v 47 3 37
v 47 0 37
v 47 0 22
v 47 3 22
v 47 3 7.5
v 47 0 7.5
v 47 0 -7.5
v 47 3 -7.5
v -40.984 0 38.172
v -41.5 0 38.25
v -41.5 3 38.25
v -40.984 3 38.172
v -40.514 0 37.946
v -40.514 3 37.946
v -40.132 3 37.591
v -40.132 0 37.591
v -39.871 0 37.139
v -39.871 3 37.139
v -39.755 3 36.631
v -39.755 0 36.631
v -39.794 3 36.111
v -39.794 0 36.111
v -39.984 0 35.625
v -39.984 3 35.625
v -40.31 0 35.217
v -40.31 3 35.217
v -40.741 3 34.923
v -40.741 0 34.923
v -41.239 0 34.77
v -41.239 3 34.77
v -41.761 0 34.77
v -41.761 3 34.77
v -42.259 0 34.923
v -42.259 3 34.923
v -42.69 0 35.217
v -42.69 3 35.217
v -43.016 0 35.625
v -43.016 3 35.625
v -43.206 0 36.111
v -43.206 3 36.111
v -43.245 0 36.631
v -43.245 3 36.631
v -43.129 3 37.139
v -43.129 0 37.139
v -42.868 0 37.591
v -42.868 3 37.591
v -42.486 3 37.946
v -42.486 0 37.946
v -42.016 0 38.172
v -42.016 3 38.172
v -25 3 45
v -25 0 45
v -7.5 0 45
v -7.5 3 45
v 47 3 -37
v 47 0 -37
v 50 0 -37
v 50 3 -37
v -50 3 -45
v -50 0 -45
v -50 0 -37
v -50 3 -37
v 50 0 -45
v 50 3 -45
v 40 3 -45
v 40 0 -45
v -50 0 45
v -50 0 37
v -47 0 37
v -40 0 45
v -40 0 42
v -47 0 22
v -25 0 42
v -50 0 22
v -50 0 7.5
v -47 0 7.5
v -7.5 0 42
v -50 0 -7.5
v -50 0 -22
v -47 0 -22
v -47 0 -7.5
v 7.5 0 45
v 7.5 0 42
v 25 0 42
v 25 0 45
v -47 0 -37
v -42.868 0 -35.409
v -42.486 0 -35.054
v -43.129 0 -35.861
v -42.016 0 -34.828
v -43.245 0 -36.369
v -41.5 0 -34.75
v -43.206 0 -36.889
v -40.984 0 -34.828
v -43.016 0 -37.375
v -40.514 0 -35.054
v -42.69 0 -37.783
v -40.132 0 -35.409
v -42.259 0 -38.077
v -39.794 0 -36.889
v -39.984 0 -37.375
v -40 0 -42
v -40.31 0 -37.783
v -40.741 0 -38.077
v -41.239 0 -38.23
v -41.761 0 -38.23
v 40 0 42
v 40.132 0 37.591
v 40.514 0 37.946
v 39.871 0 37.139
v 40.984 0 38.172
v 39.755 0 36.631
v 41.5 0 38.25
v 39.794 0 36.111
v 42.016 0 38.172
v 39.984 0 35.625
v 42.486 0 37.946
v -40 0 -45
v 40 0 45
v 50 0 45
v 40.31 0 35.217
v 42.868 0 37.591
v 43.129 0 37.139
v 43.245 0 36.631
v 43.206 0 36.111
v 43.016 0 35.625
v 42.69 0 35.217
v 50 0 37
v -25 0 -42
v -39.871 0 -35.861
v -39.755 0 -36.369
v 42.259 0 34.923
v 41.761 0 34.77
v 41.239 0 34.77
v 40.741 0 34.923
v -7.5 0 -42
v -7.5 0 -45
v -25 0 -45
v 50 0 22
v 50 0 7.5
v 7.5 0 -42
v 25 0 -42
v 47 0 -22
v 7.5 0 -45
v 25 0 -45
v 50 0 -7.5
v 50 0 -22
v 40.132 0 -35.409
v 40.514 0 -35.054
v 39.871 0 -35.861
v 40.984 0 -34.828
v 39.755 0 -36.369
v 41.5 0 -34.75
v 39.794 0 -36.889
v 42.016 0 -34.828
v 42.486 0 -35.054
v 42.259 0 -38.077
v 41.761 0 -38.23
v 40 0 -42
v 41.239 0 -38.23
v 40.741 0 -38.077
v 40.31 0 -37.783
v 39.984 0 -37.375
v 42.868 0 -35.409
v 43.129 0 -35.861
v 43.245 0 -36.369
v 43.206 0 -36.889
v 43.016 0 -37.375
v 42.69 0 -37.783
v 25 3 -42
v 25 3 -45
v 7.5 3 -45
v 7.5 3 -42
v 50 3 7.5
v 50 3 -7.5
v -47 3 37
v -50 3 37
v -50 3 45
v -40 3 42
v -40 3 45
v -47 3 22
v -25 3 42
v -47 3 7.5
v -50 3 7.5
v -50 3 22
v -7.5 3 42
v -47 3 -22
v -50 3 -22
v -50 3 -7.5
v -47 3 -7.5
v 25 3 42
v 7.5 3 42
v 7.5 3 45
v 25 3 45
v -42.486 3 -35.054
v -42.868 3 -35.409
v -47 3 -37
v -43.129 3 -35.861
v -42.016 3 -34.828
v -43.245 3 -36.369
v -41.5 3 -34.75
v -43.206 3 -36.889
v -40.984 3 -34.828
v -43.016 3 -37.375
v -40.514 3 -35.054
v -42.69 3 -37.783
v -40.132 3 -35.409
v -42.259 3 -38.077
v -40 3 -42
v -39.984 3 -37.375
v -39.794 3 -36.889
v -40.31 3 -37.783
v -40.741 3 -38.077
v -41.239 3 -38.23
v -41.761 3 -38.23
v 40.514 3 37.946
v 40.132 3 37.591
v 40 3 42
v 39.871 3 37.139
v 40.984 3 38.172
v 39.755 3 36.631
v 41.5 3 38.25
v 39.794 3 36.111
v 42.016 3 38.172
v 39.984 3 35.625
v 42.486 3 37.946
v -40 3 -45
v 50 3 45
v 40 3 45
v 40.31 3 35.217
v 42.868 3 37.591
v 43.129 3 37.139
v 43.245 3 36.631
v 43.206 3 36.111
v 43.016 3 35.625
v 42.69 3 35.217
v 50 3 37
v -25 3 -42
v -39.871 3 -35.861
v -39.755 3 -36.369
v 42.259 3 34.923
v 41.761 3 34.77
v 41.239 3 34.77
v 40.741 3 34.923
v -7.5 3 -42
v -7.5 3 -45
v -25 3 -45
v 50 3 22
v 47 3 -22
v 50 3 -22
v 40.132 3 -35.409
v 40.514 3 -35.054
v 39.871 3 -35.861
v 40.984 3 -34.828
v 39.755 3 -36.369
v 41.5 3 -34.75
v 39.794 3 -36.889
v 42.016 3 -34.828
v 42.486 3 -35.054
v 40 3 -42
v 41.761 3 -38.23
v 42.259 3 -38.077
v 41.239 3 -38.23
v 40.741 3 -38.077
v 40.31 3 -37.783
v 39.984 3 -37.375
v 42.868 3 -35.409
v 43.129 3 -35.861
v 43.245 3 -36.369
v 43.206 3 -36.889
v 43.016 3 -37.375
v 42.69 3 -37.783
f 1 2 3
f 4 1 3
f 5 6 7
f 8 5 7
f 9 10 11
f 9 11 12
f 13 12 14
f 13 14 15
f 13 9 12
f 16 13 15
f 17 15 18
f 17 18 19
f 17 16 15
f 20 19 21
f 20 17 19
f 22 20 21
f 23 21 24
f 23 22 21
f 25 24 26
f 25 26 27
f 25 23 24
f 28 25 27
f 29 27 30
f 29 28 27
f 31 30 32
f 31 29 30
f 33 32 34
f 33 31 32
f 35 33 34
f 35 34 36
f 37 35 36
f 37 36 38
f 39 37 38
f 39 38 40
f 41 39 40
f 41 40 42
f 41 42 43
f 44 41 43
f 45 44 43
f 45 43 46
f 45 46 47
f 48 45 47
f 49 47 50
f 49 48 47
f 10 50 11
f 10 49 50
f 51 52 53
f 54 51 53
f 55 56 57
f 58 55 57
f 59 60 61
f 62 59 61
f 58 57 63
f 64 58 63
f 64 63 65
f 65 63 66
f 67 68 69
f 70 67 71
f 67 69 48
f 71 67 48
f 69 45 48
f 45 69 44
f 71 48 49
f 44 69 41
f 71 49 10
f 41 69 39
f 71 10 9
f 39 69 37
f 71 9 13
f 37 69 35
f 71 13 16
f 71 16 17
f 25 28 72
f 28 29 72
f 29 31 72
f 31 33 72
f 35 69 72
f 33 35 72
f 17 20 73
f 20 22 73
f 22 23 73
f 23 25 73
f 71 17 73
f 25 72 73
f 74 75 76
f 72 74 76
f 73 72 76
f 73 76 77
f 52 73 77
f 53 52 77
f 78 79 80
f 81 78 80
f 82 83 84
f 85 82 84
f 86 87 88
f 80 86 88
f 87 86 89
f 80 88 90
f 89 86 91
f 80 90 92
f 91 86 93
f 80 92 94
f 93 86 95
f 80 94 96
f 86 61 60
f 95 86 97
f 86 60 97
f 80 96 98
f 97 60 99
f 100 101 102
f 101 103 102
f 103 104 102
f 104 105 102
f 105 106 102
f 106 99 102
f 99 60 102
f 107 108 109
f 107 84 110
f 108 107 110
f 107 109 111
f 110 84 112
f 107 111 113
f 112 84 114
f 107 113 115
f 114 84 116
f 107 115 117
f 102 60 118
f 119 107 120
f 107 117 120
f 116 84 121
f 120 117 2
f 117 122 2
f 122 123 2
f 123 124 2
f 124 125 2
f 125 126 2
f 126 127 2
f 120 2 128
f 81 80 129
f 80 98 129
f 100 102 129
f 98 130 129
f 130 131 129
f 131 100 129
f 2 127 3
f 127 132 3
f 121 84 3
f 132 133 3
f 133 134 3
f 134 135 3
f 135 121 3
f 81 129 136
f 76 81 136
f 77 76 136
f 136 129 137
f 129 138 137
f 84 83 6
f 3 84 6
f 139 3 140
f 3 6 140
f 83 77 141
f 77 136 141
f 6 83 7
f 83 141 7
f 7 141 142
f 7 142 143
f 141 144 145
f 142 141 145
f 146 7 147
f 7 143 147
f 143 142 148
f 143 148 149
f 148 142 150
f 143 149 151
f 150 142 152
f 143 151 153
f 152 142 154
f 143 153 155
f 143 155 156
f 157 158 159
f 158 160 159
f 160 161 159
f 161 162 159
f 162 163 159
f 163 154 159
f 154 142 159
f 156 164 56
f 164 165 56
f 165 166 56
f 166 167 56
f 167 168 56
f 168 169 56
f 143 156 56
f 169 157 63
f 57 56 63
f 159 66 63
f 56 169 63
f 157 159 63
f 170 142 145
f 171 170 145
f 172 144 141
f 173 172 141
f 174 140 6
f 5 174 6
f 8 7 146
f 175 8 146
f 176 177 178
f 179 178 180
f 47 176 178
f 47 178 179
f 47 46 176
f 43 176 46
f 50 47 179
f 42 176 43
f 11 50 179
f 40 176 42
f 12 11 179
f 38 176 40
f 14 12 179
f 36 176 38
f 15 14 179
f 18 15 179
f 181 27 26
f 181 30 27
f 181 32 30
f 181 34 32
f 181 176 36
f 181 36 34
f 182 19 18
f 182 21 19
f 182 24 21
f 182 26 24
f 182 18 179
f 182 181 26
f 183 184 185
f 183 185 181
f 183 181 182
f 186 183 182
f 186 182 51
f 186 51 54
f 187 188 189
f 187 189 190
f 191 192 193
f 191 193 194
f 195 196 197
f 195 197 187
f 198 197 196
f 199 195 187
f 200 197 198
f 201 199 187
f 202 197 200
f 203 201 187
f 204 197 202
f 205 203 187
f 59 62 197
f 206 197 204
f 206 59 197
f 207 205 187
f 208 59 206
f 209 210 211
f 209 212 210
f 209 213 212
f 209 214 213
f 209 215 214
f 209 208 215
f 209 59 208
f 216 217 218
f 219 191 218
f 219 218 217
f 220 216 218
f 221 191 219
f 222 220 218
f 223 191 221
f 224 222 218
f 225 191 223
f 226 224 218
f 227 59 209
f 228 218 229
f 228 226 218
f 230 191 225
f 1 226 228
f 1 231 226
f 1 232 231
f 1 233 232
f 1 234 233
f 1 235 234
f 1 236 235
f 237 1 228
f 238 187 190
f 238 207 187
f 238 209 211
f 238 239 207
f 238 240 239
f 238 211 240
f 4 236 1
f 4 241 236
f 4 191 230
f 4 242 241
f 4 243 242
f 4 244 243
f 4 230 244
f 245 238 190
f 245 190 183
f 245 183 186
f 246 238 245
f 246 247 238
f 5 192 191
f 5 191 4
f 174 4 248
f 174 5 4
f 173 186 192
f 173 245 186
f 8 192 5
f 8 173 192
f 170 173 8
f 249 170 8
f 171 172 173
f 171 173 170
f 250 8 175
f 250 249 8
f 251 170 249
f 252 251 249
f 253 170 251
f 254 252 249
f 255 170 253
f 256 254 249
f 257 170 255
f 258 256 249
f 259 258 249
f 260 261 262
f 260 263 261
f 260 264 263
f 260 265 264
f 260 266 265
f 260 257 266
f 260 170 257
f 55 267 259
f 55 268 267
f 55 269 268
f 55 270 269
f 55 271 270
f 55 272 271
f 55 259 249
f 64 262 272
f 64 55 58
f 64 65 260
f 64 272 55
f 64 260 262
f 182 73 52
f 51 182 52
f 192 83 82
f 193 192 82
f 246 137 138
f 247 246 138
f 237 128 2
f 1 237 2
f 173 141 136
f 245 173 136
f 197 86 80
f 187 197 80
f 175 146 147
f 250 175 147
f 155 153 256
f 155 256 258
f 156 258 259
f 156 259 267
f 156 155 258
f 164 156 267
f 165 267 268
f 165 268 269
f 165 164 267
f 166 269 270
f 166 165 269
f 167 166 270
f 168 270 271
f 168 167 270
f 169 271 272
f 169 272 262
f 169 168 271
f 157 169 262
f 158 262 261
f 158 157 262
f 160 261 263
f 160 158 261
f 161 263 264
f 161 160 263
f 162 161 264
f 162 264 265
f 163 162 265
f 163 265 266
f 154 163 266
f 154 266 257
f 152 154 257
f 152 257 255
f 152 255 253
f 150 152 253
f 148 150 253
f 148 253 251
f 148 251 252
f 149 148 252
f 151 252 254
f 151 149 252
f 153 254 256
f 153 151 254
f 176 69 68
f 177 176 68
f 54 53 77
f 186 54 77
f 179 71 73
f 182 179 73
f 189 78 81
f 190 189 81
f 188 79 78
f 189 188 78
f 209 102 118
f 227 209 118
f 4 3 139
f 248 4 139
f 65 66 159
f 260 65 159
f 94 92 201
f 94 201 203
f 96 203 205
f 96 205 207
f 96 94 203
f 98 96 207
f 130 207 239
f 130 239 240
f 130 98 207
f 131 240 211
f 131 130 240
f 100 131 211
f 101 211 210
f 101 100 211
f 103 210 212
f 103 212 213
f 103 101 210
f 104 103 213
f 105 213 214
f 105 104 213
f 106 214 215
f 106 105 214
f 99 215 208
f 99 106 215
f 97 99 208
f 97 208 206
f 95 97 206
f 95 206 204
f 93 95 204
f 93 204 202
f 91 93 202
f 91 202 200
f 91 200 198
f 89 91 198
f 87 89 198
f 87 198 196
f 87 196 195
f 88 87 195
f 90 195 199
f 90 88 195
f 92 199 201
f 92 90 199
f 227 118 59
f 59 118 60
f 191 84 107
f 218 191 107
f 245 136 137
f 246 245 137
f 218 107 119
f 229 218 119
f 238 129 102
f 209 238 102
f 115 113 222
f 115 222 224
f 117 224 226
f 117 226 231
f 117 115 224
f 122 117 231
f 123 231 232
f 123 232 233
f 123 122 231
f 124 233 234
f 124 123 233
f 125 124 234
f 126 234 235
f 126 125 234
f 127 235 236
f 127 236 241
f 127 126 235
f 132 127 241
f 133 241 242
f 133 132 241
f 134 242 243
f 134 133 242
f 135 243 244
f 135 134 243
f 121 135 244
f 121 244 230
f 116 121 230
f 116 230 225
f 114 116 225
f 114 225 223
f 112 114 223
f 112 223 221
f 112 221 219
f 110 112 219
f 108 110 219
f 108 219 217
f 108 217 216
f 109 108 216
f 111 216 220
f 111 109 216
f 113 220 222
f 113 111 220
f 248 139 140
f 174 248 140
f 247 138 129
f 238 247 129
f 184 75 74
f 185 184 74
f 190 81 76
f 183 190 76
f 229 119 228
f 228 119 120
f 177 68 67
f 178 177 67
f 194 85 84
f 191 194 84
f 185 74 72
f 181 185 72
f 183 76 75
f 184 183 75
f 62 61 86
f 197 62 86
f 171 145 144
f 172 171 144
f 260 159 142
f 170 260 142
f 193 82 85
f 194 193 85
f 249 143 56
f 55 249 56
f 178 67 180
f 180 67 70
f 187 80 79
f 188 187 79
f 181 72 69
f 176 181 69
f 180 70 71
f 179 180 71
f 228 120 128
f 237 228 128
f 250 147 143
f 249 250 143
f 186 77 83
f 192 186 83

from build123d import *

# Parameters (mm, degrees)
SKETCH_1_R      = 1.75
EXTRUDE_1_DEPTH = 3


with BuildPart() as part:
    # 草图1 → 凸台-拉伸1 (new body)
    with BuildSketch(Plane(origin=(0, 0, 0), x_dir=(1, 0, 0), z_dir=(0, 1, 0))):
        Polygon((-50, -45), (-40, -45), (-40, -42), (-25, -42), (-25, -45), (-7.5, -45), (-7.5, -42), (7.5, -42), (7.5, -45), (25, -45), (25, -42), (40, -42), (40, -45), (50, -45), (50, -37), (47, -37), (47, -22), (50, -22), (50, -7.5), (47, -7.5), (47, 7.5), (50, 7.5), (50, 22), (47, 22), (47, 37), (50, 37), (50, 45), (40, 45), (40, 42), (25, 42), (25, 45), (7.5, 45), (7.5, 42), (-7.5, 42), (-7.5, 45), (-25, 45), (-25, 42), (-40, 42), (-40, 45), (-50, 45), (-50, 37), (-47, 37), (-47, 22), (-50, 22), (-50, 7.5), (-47, 7.5), (-47, -7.5), (-50, -7.5), (-50, -22), (-47, -22), (-47, -37), (-50, -37), align=None)
        with Locations(Location((-41.5, 36.5, 0), (0, 0, 270))):
            Circle(SKETCH_1_R, mode=Mode.SUBTRACT)
        with Locations(Location((41.5, 36.5, 0), (0, 0, 270))):
            Circle(SKETCH_1_R, mode=Mode.SUBTRACT)
        with Locations(Location((41.5, -36.5, 0), (0, 0, 270))):
            Circle(SKETCH_1_R, mode=Mode.SUBTRACT)
        with Locations(Location((-41.5, -36.5, 0), (0, 0, 270))):
            Circle(SKETCH_1_R, mode=Mode.SUBTRACT)
    extrude(amount=EXTRUDE_1_DEPTH)


solid = part.part
